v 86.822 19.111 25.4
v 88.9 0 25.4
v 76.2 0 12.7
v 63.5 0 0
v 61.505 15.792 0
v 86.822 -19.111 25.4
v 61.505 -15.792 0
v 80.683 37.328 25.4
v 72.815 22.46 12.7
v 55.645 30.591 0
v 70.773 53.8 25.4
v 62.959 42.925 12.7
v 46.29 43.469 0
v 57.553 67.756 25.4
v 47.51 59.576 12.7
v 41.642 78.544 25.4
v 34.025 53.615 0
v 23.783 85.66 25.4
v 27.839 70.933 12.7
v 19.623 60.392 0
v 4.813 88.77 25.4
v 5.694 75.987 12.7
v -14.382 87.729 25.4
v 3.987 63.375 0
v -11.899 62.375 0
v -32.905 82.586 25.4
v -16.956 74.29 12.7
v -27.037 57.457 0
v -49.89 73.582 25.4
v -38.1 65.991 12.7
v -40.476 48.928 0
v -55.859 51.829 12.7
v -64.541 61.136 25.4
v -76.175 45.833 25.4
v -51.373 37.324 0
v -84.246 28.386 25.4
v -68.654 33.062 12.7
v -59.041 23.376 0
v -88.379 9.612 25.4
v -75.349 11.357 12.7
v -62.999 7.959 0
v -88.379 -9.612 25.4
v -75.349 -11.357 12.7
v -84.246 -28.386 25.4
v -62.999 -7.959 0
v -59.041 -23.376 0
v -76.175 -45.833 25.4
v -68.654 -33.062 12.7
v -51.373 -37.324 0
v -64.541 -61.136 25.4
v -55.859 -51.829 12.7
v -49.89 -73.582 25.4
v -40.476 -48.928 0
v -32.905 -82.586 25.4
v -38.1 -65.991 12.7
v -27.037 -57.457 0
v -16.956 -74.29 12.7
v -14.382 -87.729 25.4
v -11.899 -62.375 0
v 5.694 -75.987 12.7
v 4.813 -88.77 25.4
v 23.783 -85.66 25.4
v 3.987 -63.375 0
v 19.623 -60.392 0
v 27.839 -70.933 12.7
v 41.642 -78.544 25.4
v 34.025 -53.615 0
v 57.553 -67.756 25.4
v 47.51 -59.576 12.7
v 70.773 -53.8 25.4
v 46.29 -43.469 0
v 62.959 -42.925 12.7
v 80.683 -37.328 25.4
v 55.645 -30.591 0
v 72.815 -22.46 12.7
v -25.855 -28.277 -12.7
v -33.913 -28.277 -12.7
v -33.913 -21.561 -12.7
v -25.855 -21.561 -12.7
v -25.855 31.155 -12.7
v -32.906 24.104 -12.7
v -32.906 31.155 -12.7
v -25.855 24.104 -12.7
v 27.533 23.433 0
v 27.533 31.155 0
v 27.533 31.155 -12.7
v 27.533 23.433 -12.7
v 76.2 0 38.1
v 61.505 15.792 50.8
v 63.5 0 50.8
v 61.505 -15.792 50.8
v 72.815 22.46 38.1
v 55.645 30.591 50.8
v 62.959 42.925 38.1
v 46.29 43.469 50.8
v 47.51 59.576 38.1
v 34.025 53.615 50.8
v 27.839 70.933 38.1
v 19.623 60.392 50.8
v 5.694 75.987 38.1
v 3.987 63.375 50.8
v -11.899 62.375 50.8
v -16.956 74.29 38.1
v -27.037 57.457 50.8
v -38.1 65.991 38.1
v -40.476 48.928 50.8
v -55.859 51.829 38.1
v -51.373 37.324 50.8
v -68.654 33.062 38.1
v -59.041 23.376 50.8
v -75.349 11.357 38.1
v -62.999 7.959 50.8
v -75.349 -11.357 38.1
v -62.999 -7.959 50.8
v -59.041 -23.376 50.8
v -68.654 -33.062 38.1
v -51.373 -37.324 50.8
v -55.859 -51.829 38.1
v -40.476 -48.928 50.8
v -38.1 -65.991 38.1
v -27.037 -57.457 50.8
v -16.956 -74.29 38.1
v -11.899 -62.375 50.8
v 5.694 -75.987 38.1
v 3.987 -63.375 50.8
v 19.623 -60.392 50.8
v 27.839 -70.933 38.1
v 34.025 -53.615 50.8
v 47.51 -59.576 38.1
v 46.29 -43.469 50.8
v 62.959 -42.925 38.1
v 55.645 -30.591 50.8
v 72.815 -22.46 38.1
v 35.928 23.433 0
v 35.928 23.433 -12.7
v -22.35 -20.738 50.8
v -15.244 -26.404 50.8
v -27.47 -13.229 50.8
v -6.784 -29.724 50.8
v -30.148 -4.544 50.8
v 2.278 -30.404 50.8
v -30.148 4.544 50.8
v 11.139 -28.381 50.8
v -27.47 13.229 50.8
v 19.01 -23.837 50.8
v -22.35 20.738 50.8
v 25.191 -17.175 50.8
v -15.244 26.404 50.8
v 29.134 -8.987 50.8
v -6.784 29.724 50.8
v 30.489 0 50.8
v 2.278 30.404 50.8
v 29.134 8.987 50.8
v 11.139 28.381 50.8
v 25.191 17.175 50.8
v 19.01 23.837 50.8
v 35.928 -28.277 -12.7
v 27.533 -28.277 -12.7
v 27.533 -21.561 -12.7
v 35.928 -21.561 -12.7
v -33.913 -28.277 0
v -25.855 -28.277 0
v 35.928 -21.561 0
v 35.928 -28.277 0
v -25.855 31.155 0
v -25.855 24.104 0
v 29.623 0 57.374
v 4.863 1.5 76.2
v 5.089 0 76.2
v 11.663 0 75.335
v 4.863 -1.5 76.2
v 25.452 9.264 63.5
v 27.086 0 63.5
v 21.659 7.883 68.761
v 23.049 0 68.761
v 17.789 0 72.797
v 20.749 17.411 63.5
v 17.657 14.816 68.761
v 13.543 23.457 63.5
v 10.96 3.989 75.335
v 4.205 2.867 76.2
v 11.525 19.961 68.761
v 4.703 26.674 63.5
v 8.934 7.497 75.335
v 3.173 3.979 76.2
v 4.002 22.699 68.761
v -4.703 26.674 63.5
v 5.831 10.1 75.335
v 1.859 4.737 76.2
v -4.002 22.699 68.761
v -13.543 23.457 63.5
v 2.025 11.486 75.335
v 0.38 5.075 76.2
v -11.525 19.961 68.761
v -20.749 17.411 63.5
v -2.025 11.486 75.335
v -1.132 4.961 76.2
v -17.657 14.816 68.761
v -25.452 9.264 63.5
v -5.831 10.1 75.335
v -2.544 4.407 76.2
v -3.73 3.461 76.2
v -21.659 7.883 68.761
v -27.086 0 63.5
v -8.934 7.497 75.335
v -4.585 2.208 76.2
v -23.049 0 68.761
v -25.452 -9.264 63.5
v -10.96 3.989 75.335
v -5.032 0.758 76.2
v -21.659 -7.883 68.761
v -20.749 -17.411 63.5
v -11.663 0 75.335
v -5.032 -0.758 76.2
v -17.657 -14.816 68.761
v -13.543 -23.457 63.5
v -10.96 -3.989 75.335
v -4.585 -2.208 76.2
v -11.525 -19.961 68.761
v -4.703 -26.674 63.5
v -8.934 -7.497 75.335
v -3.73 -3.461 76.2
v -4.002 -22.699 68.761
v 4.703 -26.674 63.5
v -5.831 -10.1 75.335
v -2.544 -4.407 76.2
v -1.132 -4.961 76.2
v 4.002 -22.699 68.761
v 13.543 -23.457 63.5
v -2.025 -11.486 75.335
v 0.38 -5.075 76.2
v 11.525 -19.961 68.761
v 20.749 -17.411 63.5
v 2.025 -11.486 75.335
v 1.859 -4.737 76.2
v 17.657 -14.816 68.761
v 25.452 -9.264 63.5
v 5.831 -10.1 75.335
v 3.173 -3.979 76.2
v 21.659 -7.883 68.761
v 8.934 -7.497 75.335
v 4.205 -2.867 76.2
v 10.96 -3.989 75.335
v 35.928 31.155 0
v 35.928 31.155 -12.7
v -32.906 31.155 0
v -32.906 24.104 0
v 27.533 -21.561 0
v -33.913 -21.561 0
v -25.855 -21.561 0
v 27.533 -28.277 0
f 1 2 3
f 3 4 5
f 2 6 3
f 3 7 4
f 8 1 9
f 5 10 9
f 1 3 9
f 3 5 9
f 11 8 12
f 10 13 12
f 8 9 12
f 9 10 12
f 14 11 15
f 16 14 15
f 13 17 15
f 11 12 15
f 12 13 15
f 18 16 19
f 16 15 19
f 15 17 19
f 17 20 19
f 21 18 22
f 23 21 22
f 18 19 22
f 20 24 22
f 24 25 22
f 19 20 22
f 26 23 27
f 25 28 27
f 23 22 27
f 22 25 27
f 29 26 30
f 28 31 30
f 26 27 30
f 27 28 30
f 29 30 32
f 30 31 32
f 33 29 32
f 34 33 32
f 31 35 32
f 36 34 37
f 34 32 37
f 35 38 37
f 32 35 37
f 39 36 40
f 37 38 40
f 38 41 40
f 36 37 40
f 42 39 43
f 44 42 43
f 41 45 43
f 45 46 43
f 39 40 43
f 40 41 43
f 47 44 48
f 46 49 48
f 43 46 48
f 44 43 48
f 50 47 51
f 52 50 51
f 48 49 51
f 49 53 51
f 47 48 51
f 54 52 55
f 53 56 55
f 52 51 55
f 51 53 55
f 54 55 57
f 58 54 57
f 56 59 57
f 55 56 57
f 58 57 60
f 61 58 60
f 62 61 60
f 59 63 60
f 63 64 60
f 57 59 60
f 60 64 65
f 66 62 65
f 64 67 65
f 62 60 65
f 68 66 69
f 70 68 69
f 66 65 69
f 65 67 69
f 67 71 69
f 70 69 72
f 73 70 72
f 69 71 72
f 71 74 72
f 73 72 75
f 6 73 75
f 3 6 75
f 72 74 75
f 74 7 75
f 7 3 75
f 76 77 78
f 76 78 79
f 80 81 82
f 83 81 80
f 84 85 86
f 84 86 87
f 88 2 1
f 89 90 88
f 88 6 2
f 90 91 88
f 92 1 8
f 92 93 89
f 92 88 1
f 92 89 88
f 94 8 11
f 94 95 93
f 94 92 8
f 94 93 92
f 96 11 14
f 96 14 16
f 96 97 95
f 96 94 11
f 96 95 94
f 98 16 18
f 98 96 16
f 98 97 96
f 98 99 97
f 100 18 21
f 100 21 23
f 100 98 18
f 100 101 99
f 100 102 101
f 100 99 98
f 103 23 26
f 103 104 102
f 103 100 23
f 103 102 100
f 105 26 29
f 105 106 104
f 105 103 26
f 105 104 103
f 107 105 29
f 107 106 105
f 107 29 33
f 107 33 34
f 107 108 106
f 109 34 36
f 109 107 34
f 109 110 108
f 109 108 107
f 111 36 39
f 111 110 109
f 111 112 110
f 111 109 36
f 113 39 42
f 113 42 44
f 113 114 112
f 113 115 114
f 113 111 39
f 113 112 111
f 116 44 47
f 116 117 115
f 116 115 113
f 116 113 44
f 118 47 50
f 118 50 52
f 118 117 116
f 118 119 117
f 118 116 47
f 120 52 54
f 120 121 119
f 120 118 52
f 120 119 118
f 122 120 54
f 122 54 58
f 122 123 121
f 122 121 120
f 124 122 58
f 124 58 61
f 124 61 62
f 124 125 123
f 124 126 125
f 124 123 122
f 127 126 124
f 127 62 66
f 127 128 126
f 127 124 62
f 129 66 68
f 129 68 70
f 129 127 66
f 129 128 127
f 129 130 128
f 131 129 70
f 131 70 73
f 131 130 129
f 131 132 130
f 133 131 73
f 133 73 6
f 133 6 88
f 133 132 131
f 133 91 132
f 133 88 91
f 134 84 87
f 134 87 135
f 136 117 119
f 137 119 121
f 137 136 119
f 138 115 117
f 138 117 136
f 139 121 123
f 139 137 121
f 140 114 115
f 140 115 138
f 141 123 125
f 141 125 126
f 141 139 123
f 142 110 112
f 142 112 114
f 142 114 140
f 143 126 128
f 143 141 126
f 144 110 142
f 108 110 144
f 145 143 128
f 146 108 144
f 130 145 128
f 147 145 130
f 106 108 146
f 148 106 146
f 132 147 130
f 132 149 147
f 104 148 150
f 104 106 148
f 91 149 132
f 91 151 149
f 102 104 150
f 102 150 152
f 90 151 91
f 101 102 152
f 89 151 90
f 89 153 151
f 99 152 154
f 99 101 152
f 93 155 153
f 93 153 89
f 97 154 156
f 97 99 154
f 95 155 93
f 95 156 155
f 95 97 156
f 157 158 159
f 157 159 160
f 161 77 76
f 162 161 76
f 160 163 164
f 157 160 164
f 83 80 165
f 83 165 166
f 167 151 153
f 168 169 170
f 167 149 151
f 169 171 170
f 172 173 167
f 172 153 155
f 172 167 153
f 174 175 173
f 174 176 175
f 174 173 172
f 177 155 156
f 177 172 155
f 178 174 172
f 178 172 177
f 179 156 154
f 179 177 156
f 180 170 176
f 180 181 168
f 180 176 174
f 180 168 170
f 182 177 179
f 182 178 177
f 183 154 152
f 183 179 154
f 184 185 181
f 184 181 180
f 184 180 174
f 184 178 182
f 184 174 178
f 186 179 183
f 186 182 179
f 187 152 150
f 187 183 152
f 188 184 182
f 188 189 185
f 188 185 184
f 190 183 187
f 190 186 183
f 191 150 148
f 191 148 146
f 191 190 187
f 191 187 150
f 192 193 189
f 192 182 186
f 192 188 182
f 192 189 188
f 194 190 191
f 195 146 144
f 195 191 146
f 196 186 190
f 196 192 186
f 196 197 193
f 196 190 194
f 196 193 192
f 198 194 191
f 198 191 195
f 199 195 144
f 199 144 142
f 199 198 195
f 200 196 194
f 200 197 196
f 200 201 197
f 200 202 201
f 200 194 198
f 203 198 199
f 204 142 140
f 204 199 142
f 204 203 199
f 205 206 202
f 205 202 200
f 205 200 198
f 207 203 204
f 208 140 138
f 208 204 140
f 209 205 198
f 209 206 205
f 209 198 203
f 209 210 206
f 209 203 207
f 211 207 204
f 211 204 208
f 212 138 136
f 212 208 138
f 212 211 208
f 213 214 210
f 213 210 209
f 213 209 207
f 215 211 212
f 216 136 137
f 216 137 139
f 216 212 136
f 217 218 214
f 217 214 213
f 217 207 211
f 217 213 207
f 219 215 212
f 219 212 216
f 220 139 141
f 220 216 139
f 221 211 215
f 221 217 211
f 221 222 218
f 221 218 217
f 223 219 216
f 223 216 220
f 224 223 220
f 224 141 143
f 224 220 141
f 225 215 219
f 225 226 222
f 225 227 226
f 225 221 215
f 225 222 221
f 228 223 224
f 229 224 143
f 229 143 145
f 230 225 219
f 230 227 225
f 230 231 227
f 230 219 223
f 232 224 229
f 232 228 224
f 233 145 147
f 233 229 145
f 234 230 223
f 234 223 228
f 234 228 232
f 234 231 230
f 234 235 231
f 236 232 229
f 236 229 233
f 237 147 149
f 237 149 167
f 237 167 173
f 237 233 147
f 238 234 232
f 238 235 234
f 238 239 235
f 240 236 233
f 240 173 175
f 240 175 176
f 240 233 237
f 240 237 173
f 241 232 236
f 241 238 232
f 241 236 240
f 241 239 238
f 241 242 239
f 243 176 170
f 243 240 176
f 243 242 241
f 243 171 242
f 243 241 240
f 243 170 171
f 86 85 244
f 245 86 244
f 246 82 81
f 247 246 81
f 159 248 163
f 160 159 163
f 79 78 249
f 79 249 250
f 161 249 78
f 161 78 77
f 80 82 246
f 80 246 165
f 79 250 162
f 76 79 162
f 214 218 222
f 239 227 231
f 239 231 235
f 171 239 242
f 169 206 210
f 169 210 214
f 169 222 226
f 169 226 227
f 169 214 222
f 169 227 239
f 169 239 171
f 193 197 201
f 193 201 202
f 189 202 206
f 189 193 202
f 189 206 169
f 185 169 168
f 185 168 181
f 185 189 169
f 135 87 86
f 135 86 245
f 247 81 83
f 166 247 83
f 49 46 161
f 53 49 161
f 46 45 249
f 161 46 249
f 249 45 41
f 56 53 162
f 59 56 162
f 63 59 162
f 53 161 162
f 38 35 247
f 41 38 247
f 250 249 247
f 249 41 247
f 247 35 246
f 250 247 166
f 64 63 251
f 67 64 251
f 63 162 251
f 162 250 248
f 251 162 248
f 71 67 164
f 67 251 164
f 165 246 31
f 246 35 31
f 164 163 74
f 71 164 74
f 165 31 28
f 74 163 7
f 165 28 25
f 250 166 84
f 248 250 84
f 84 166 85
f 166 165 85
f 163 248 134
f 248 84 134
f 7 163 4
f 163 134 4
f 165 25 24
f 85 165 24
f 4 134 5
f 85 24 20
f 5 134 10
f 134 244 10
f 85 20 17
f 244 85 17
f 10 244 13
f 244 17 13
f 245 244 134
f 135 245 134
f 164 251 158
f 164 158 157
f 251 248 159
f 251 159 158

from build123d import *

# Parameters (mm, degrees)
F0_R     = 88.9
F1_DEPTH = 50.8
F2_SIZE  = 25.4
F3_SIZE  = 25.39999
F4_R     = 30.4888877606
F5_DEPTH = 25.4
F6_R     = 25.39999
F7_W     = 8.3943400532
F7_H     = 6.7154671997
F7_W_2   = 8.0585591495
F7_W_3   = 7.0512406528
F7_H_2   = 7.0512406528
F7_H_3   = 7.722787559
F8_DEPTH = 12.7


# Not quite as in the source:
# - a fillet or chamfer is up to 0.001 mm smaller than in the source, because OpenCascade refuses the exact size


with BuildPart() as f1:
    # F0 (on Top) → F1 (new body)
    with BuildSketch(Plane.XY):
        Circle(F0_R)
    extrude(amount=F1_DEPTH)

    # F2
    f2_edges = [f1.edges().sort_by_distance(p)[0] for p in [
        (-88.9, 0, 50.8),
    ]]
    chamfer(f2_edges, length=F2_SIZE)

    # F3 (size 25.4 in the source; OpenCascade refuses exactly that, so slightly less here)
    f3_edges = [f1.edges().sort_by_distance(p)[0] for p in [
        (-88.9, 0, 0),
    ]]
    chamfer(f3_edges, length=F3_SIZE)

    # F4 (on face) → F5 (join)
    with BuildSketch(Plane.XY.offset(50.8)):
        Circle(F4_R)
    extrude(amount=F5_DEPTH)

    # F6 (radius 25.4 in the source; OpenCascade refuses exactly that, so slightly less here)
    f6_edges = [f1.edges().sort_by_distance(p)[0] for p in [
        (-30.488888, 0, 76.2),
    ]]
    fillet(f6_edges, radius=F6_R)

    # F7 (on face) → F8 (join)
    with BuildSketch(Plane(origin=(0, 0, 0), x_dir=(1, 0, 0), z_dir=(0, 0, -1))):
        with Locations((31.7305838689, 24.918817915)):
            Rectangle(F7_W, F7_H)
        with Locations((-29.8838298768, 24.918817915)):
            Rectangle(F7_W_2, F7_H)
        with Locations((-29.3801706284, -27.6297163218)):
            Rectangle(F7_W_3, F7_H_2)
        with Locations((31.7305838689, -27.2939428687)):
            Rectangle(F7_W, F7_H_3)
    extrude(amount=F8_DEPTH)


solid = f1.part
